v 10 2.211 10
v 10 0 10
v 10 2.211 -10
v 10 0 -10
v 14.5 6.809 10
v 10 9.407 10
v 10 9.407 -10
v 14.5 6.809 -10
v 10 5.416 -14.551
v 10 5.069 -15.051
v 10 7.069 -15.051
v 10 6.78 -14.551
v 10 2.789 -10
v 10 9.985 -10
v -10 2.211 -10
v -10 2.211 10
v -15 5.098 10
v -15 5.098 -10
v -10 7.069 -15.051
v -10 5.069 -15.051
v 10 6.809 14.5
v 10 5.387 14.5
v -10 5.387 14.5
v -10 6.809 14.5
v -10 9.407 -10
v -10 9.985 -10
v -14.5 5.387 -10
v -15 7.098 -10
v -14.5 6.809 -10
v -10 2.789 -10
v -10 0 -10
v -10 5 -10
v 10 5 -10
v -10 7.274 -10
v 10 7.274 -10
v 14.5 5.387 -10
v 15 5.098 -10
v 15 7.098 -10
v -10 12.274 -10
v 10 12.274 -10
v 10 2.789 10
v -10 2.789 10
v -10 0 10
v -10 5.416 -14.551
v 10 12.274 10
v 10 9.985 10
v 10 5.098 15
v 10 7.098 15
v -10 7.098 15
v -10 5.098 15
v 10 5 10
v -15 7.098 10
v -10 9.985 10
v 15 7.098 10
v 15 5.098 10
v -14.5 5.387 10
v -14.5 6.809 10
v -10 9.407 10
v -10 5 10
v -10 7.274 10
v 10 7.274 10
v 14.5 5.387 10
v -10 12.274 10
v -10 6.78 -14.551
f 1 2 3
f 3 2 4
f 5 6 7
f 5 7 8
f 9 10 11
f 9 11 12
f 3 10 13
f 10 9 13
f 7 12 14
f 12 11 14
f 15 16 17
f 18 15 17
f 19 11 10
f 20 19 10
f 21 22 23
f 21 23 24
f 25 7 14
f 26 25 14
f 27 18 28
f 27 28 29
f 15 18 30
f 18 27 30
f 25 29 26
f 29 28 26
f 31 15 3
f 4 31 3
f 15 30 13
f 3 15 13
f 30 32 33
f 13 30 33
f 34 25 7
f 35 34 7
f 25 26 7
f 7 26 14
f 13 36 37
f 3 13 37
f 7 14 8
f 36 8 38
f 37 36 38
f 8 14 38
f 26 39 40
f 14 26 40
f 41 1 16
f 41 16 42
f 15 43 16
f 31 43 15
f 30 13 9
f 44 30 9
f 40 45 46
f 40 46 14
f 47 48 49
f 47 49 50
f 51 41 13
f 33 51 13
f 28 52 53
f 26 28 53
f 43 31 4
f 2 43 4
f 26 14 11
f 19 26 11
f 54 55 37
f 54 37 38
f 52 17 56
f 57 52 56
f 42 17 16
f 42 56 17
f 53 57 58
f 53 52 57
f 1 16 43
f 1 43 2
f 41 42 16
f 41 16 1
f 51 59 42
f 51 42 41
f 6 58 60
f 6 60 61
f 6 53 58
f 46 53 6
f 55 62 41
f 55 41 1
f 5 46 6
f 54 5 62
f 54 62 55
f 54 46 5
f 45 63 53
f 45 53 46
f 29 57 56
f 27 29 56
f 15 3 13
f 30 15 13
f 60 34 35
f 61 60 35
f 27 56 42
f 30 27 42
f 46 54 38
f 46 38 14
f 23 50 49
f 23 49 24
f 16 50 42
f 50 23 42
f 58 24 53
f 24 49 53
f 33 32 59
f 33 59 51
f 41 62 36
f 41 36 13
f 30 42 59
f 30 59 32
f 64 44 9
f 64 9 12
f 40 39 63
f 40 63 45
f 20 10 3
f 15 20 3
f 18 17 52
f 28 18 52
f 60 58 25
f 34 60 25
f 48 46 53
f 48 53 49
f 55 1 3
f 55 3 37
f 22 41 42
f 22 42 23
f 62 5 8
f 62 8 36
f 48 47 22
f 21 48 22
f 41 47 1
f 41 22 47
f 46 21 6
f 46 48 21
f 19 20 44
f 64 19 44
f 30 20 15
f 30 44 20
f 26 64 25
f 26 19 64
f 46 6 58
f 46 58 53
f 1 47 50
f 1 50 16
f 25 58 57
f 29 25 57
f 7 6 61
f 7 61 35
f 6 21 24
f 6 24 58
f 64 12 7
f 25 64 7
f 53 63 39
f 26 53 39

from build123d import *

# Parameters (mm, degrees)
SKETCH1_W           = 20
SKETCH1_H           = 20
BOSS_EXTRUDE1_DEPTH = 5
BOSS_EXTRUDE2_DEPTH = 20
BOSS_EXTRUDE4_DEPTH = 20
BOSS_EXTRUDE6_DEPTH = 20


with BuildPart() as part:
    # Sketch1 → Boss-Extrude1 (new body)
    with BuildSketch(Plane(origin=(0, 0, 0), x_dir=(1, 0, 0), z_dir=(0, 1, 0))):
        Rectangle(SKETCH1_W, SKETCH1_H)
    boss_extrude1 = extrude(amount=BOSS_EXTRUDE1_DEPTH)

    # Sketch2 → Boss-Extrude2 (add)
    with BuildSketch(Plane.XY.offset(10)):
        Polygon((10, 2.211324865), (15, 5.098076211), (15, 7.098076211), (10, 9.984827557), (10, 9.407477288), (14.5, 6.809401077), (14.5, 5.386751346), (10, 2.788675135), align=None)
    boss_extrude2 = extrude(amount=-BOSS_EXTRUDE2_DEPTH)

    # Mirror1: Boss-Extrude2 across plane
    add(boss_extrude2.mirror(Plane(origin=(0, 0, 0), x_dir=(0, 0, 1), z_dir=(1, 0, 0))))

    # Mirror2: Boss-Extrude1 across plane
    add(boss_extrude1.mirror(Plane.ZX.offset(6.137)))


with BuildPart() as body_2:
    # Sketch7 → Boss-Extrude4 (new body)
    with BuildSketch(Plane(origin=(10, 0, 0), x_dir=(0, 0, -1), z_dir=(1, 0, 0))):
        Polygon((-10, 2.211324865), (-10, 2.788675135), (-14.5, 5.386751346), (-14.5, 6.809401077), (-10, 9.407477288), (-10, 9.984827557), (-15, 7.098076211), (-15, 5.098076211), align=None)
    extrude(amount=-BOSS_EXTRUDE4_DEPTH)


with BuildPart() as body_3:
    # Sketch8 → Boss-Extrude6 (new body)
    with BuildSketch(Plane(origin=(10, 0, 0), x_dir=(0, 0, -1), z_dir=(1, 0, 0))):
        Polygon((10, 2.211324865), (10, 2.788675135), (14.550639741, 5.415988214), (14.550639741, 6.780164209), (10, 9.407477288), (10, 9.984827557), (15.050639741, 7.068839343), (15.050639741, 5.068839343), align=None)
    extrude(amount=-BOSS_EXTRUDE6_DEPTH)


solid = Compound([part.part, body_2.part, body_3.part])
